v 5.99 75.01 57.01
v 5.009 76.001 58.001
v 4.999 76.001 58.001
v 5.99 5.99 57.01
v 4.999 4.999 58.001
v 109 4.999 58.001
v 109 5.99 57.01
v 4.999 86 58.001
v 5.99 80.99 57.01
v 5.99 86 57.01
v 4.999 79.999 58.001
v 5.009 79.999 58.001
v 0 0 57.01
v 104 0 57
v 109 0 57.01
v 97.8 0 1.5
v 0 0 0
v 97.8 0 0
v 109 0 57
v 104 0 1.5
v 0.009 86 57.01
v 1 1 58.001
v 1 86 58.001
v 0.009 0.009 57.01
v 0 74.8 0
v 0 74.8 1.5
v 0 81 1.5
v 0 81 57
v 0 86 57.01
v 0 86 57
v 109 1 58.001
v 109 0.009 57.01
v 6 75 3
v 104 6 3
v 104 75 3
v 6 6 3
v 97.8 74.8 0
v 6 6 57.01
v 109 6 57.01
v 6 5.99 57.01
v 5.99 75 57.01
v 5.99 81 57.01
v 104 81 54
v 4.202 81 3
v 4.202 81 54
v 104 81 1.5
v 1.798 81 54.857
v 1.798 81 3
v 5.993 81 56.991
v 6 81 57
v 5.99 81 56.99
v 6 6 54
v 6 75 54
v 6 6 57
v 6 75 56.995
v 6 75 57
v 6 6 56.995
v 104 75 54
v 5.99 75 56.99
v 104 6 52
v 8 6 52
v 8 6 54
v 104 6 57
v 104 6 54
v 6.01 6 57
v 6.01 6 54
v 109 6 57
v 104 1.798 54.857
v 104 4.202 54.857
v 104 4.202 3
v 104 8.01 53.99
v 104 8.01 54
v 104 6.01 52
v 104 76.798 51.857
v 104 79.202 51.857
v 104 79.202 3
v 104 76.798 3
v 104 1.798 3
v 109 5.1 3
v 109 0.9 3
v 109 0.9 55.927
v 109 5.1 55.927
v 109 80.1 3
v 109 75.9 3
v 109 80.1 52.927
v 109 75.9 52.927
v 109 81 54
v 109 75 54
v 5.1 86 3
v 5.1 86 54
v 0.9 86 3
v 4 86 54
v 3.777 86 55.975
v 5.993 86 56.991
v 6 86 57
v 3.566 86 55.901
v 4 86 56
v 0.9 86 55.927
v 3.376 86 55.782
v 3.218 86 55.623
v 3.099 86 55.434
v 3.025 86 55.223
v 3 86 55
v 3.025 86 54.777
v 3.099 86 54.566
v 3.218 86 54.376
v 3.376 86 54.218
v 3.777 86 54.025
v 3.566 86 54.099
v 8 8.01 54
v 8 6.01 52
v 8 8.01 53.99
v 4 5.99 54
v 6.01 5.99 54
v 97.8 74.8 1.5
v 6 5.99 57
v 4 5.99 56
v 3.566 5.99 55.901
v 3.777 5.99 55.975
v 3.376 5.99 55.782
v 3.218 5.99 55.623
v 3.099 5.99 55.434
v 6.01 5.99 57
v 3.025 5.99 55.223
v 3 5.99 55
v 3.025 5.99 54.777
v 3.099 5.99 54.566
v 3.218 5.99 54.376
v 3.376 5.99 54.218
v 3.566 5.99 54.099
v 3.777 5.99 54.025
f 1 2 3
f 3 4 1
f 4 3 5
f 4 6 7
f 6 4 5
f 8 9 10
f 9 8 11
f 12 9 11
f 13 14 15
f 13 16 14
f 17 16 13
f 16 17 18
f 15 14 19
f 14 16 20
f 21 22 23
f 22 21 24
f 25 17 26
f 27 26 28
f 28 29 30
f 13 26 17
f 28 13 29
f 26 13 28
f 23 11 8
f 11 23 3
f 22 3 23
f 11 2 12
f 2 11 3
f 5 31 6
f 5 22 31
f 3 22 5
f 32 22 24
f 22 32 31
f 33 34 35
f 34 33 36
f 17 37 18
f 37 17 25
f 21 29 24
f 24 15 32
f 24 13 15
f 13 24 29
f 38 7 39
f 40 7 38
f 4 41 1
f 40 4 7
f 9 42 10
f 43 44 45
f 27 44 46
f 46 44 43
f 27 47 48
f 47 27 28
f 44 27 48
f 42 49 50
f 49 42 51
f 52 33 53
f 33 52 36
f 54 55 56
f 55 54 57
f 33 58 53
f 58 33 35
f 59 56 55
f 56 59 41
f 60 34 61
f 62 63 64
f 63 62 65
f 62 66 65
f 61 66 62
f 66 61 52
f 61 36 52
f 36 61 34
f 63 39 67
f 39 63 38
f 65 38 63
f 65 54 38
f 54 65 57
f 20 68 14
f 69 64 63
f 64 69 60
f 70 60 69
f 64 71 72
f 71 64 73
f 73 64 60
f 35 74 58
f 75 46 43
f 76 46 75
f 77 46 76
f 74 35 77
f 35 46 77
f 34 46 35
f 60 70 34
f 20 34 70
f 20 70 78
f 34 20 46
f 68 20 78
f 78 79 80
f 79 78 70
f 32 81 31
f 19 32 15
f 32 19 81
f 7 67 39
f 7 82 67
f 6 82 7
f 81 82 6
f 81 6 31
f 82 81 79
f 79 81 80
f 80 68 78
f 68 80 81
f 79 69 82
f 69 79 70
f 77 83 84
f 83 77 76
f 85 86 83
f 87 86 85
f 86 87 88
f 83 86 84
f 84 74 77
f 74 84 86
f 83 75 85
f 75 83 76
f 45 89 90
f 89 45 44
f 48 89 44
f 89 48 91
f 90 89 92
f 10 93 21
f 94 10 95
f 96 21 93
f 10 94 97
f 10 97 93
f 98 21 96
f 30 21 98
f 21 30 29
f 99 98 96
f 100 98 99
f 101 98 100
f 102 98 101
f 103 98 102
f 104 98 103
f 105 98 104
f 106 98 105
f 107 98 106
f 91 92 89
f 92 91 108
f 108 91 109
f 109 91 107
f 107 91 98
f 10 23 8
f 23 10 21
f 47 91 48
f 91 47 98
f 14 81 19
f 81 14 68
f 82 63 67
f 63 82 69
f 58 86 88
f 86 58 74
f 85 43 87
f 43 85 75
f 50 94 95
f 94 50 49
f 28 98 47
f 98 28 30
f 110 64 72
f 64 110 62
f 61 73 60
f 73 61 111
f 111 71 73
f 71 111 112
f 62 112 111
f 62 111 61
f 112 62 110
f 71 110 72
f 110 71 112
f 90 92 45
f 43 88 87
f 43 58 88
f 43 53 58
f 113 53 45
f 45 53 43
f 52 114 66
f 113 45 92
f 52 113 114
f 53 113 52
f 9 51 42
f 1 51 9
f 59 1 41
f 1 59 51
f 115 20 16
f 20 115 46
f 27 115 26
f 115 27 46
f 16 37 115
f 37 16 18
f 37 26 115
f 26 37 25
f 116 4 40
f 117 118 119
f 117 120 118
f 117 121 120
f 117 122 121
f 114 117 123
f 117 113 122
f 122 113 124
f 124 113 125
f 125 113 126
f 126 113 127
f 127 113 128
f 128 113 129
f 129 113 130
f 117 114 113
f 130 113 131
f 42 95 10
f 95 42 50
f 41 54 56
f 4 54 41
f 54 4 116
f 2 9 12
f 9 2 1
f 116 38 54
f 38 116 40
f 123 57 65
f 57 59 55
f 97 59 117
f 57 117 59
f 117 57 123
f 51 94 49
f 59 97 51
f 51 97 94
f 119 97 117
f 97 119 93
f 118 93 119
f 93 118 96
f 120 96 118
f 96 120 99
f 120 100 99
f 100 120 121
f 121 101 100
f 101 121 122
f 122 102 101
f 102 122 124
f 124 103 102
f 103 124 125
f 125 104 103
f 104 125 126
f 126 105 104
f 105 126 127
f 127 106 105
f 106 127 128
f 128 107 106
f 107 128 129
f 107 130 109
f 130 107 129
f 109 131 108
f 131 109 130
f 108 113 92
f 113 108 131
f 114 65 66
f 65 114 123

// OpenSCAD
// ============================================================================
// cutlery_box.scad
// Graduated 3-chamber disposable-cutlery box (Option 3) — CUT-FROM-SOLID port
// of build_box.py, for a 120 x 120 x 120 mm printer (AOSEED).
//
// WHY THIS PORT EXISTS (the whole point):
//   The hand-mesh generator (build_box.py) could not keep the 1 mm rim chamfer
//   continuous across the female dovetail joints, because where a slot's flared
//   corner crosses the sloped chamfer it needs a true boolean intersection.
//   OpenSCAD HAS that boolean kernel, so here we do exactly the "cut-from-solid"
//   thing:
//      1. Build the ENTIRE box as ONE solid, WITH the chamfer already on it.
//      2. difference() out vertical dovetail prisms ( /_\ cross-section ),
//         running from just above the base plate up THROUGH the rim, to both
//         (a) form the sliding-dovetail joints, and
//         (b) split the box into 6 bed-sized pieces.
//   Because the cut is a real boolean through the already-chamfered solid, the
//   sloped chamfer<->slot edge is produced for free => the rim chamfer stays
//   CONTINUOUS across every joint, with none of the sliver hacks.
//
// ----------------------------------------------------------------------------
// HOW TO USE
//   In the app:  set `part` below (or use the Customizer dropdown), F5 to
//                preview, F6 to render, then File > Export > STL.
//   One piece (CLI):
//      openscad -o body_knife_A.stl -D 'part="knife_A"' cutlery_box.scad
//   ALL SIX (bash, run from this folder):
//      for p in knife_A knife_B fork_A fork_B spoon_A spoon_B; do \
//        openscad -o "body_$p.stl" -D "part=\"$p\"" cutlery_box.scad ; done
//   PNG preview of one piece:
//      openscad -o knife_B.png --imgsize=1400,1000 --autocenter --viewall \
//        -D 'part="knife_B"' cutlery_box.scad
//
//   Pieces are modelled in ASSEMBLED coordinates (floor-down, z=0 is the bed),
//   so importing all six STLs together shows the assembled box directly; your
//   slicer will auto-drop each one onto the plate for printing.
//
// BED SANITY: every piece is <= 120 mm in X, Y, Z.
//   Z = 58 mm. Widest piece = spoon at 117 mm (Y). A-halves reach 109 mm (X,
//   including the protruding dovetail key). All under 120.
//
// !! I could NOT run OpenSCAD to verify this file (no binary in my sandbox) !!
//   - The rim chamfer is a SMOOTH, true-45 bevel built from hull() frustums of
//     convex rectangles. Works in every OpenSCAD since ~2015 (incl. Homebrew
//     2021.01). No stepped staircase -- and, crucially, it makes box() a clean
//     well-formed solid so the per-part booleans resolve reliably (the old
//     14-slice staircase was fragile and CGAL was dropping the walls of the
//     interior parts, leaving only the key prisms => "floating boxes").
//   - roof() is still available behind USE_ROOF=true for those who have it
//     (2021.01+ snapshots); for THIS rectangular design it is identical, so it
//     is NOT required.
//   - After F6, check the console for "WARNING"/"not a valid 2-manifold".
//     If a tenon ever looks detached, bump EPS to 0.05.
// ============================================================================


/* [Part to render / export] */
part = "knife_A"; // [knife_A, knife_B, fork_A, fork_B, spoon_A, spoon_B, assembly]

/* [Chamfer method] */
// false = smooth hull() frustum bevel (default, any OpenSCAD); true = roof() (2021.01+)
USE_ROOF = false;

/* [Heights (mm)] */
BASE   = 3.0;     // floor / base-plate thickness
COMP_H = 55.0;    // interior wall height above the floor (cutlery stack depth)

/* [Walls (mm)] */
HOST_T   = 6.0;     // thickness of every wall (thick enough to host a dovetail)
HALF_LEN = 104.0;   // printed length of each half (A = near, B = far); <120 incl. key

/* [Chamber bays (mm)] */
N_COL     = 3;       // columns of cutlery per chamber
KNIFE_COL = 23.0;    // -> knife bay 69  (3 x 19 mm knives + play)
FORK_COL  = 33.0;    // -> fork  bay 99  (3 x 29 mm forks  + play)
SPOON_COL = 37.0;    // -> spoon bay 111 (3 x 34 mm spoons + play, trimmed <120)

/* [Dovetail joint (mm)] */
DT_DEPTH = 5.0;   // tail protrusion past the seam (male key depth)
DT_NECK  = 1.2;   // half-width at the seam face (narrow)
DT_FLARE = 2.1;   // half-width at the tip (wide -> locks)
DT_CLR   = 0.4;   // FLANK/seam slide clearance added to the female socket (do not change for fit)
DT_DEPTH_RELIEF = 0.3; // extra depth on the socket BACK only, so the tail tip never bottoms out

/* [Hidden-dovetail top cap / "hat" (mm)] */
// The dovetail otherwise shows its trapezoid outline on the TOP edge of the wall.
// To hide it, the MALE piece extends the wall's full-width top (chamfer included)
// across the key footprint -> a flush, continuous top. The FEMALE piece gets a
// matching top RECESS (cap footprint + CAP_CLR) so the cap drops straight in.
// Result: the top reads as one surface with a single straight seam line at the cap
// tip; the dovetail joinery lives entirely below the cap.
//
// SELF-SUPPORTING UNDERSIDE: the cap reaches the FULL wall width at the chamfer base
// (so the top edge reads as the wall extended, with NO recessed sliver on the outer
// face), and its underside is ONE planar ramp from the chamfer's OUTER CORNER
// (half-width HOST_T/2 at z = BODY_H-CHAMFER) down to the dovetail-neck half-width
// (CAP_FOOT) at CAP_SLANT_DEG from horizontal. No little horizontal step. The ramp
// reaching full width exactly at the chamfer base means "ramp top" == "chamfer base"
// (CAP_H is DERIVED). The FEMALE recess is the same ramp + CAP_CLR play.
// TRADEOFF: because the cap runs all the way to the outer corner, the female wall
// tapers to ~0 at z = BODY_H-CHAMFER -> a thin feather edge at the joint (gradual at
// CAP_SLANT_DEG, hidden inside the joint when assembled). Accepted per design intent.
CAP_SLANT_DEG = 50;     // cap underside ramp angle from horizontal (50 = self-supporting, long flare)
CAP_FOOT = DT_NECK;     // cap-underside half-width where it meets the dovetail neck
CAP_CLR = 0.3;          // slide clearance so the male cap seats into the female top recess

/* [Rim chamfer (mm)] */
CHAMFER = 1.0;    // 45-deg comfort break broken along the top wall edges

/* [Base half-lap / anti-warp (mm)] */
// Neighbouring base plates overlap as a HORIZONTAL half-lap (shiplap) at mid-base
// height, so corners stay coplanar (no lift/protrusion). Horizontal lap faces do
// NOT bind the vertical-drop assembly. Shingle direction: A->B and knife->fork->spoon.
LAP_LEN = 6;        // overlap past the A/B seam and the knife/fork seam
LAP_LEN_FS = 2;     // overlap past the fork/SPOON seam -- SMALLER: spoon is the
                    // tightest piece (117mm of the 120mm bed); a 6mm lap there
                    // would push spoon to 123mm. 2mm keeps spoon at 119mm.
LAP_Z   = BASE/2;   // 1.5 -- horizontal split height of the lap (bottom vs top half)
LAP_CLR = 0.2;      // in-plane clearance so the shelf isn't a press fit

/* [Lid — box features that receive a flat ORDERED clear sheet] */
// The lid itself is NOT printed: it's a flat ~2 mm PETG/Tritan sheet, bullnose-polished
// edges (r=LID_EDGE_R), ordered to size. We only model the box features that receive it.
LID_T            = 2.0;   // ordered sheet thickness
LID_EDGE_R       = 1.0;   // ordered sheet bullnose edge radius (for the sheet order spec)
LID_PLAY         = 0.4;   // total vertical play in the hinge groove (sheet + this)
LID_RECESS       = 2.0;   // lid TOP sits this far BELOW the rim, so the journal pocket is fully
                          // capped (rim caps the bullnose -> retains the lid when raised; tilt-in)
HINGE_AT_MINUS_X = true;  // hinge on the -x (303mm) end wall; clip on +x. (flip = mirror; default delivered)
// perimeter support ledge (lid underside rests on it at z = BODY_H-LID_T)
LEDGE_W          = 2.0;   // ledge inward protrusion (its underside ramps back at 45 deg -> self-supporting)
GROOVE_END_INSET = 0.0;   // groove reaches the corners but RUNS OUT smoothly there (no end-face / no
                          // exposed bore); GROOVE_TAPER sets the run-out length
GROOVE_TAPER     = 4.0;   // y-length over which the eased mouth tapers out at each groove end
// hinge journal (cut into the inner face of the hinge end wall, CONTINUOUS along the long edge)
GROOVE_DEPTH     = 3.0;   // 2mm lead-in slot + 1mm pocket radius -> journal sits 2mm back from the
                          // face so its cap clears the swing relief and RETAINS the lid
GROOVE_POCKET_R  = 1.0;   // journal half-cylinder radius (the bullnose sheet edge rolls in it)
// clip latch — TWO light DETENT clips on the clip end wall, flanking a central finger notch.
// "Light detent" = small overhang so the rigid sheet pops past it by hand (not a firm lock).
CLIP_W           = 8.0;   // width of EACH of the two clips
CLIP_LIP         = 0.3;   // retaining overhang (light detent; 0.3 soft .. 0.6 firm-but-stiff)
CLIP_RAMP_H      = 1.6;   // cam-ramp height (press-to-close lead-in)
// finger notch — a through-cut in the clip wall (visible from outside), centered between the
// two clips, so a fingertip can reach the lid edge and lift it (popping both clips at once).
NOTCH_W          = 20.0;  // finger-notch width
NOTCH_DEPTH      = 6.0;   // how far down from the rim to the deepest point (past the lid edge)
NOTCH_ARCH       = 4.0;   // bottom is an ELLIPTICAL arch this tall; the rest is vertical sides
                          // (NOTCH_ARCH < NOTCH_W/2 -> a gentle arch, not a deep half-circle)


/* [Hidden] */
EPS      = 0.01;          // tiny overlap so abutting solids fuse cleanly in CGAL
// Upper-chamber pieces (fork, spoon) were cut by a cell plane laid EXACTLY on the
// divider wall's far face (the lower chamber owns that wall). intersection() along a
// plane coincident with an existing box face makes CGAL leave a ZERO-THICKNESS copy
// of the wall face -> edge-manifold + "watertight" but degenerate (OpenSCAD shows it
// as a blue back-face; Tinkercad thickens it into a phantom block). SEAM_EPS nudges
// those cut planes a hair INTO the open bay so they no longer coincide with any box
// face -> no flap. 0.02 mm is physically nothing but is well clear of CGAL's tolerance.
SEAM_EPS = 0.02;
CUT_OVER = 1.0;           // how far dovetail cutters overshoot the rim (clean cut)

BODY_H    = BASE + COMP_H;     // 58  total height
END_WALL  = HOST_T;            // end walls are dovetail hosts too -> equally thick
TOTAL_LEN = 2 * HALF_LEN;      // 208 assembled length (end wall .. end wall)

// hidden-cap ramp geometry (derived).
//   CAP_HW    = cap MAX half-width = HOST_T/2 (the full wall edge) at the chamfer base.
//   CAP_RISE  = vertical height of the self-supporting CAP_SLANT_DEG underside ramp.
//   CAP_ZRAMP = where the cap reaches full width = the chamfer base (BODY_H-CHAMFER), so
//               the ramp runs straight to the chamfer OUTER CORNER (no horizontal step).
//   CAP_ZBOT  = cap bottom = ramp start; CAP_H derived from it (for reference/report).
//   CAP_ZRAMP_R = recess ramp top, shifted down by CAP_CLR so the recess ramp stays
//               parallel to the cap ramp with uniform play.
CAP_HW      = HOST_T/2;   // cap reaches the FULL wall edge at the chamfer base
CAP_RISE    = (CAP_HW - CAP_FOOT) * tan(CAP_SLANT_DEG);
CAP_ZRAMP   = BODY_H - CHAMFER;               // full width exactly at the chamfer base / outer corner
CAP_ZBOT    = CAP_ZRAMP - CAP_RISE;
CAP_H       = BODY_H - CAP_ZBOT;              // derived; reported
CAP_ZRAMP_R = CAP_ZRAMP;   // recess ramp ALSO tops at the chamfer corner (mirror the cap) -> no vertical lip
// sanity checks
assert(CAP_ZBOT > BASE + 1,
       "cap zone dips too low -- raise CAP_SLANT_DEG");
assert(CAP_HW >= DT_FLARE,
       "cap too narrow to cover the dovetail tail");

// NOTE: lid-derived constants are defined BELOW the Y-layout block, because some of
// them (INTERIOR_Y0/Y1, CLIP_CY) depend on OUTER_L / OUTER_R / EXT_W. See "lid derived".

// bay widths
KNIFE_BAY = N_COL * KNIFE_COL; // 69
FORK_BAY  = N_COL * FORK_COL;  // 99
SPOON_BAY = N_COL * SPOON_COL; // 111

// ---- Y layout (width direction): wall | bay | divider | bay | divider | bay | wall
KNIFE_Y0 = 0;
KNIFE_Y1 = HOST_T + KNIFE_BAY + HOST_T;        // 0..81   (outer wall + bay + divider)
FORK_Y0  = KNIFE_Y1;                           // 81
FORK_Y1  = FORK_Y0 + FORK_BAY + HOST_T;        // 81..186 (bay + divider)
SPOON_Y0 = FORK_Y1;                            // 186
SPOON_Y1 = SPOON_Y0 + SPOON_BAY + HOST_T;      // 186..303(bay + outer wall)
EXT_W    = SPOON_Y1;                           // 303 total width

// lengthwise wall Y-bands [y0,y1] (host the A/B dovetails) + their centers
OUTER_L  = [0, HOST_T];                                       // [0,6]    c=3
DIV_KF   = [HOST_T + KNIFE_BAY, HOST_T + KNIFE_BAY + HOST_T]; // [75,81]  c=78
DIV_FS   = [FORK_Y0 + FORK_BAY, FORK_Y0 + FORK_BAY + HOST_T]; // [180,186]c=183
OUTER_R  = [SPOON_Y1 - HOST_T, SPOON_Y1];                     // [297,303]c=300

// ---- lid derived ---- (placed AFTER OUTER_L/OUTER_R/EXT_W so nothing is forward-referenced)
LID_TOP_Z   = BODY_H - LID_RECESS;        // 56  lid TOP (recessed); rim z=58 rises LID_RECESS above it
LID_Z_UNDER = LID_TOP_Z - LID_T;          // 54  lid underside / ledge top / lowered-divider top
POCKET_CZ   = LID_TOP_Z - LID_T/2;        // 55  journal centre (lid mid) -> pocket top = LID_TOP_Z = capped
// hinge end-wall inner face x + inward direction; clip end-wall inner face x + inward dir
HINGE_INX   = HINGE_AT_MINUS_X ? END_WALL : TOTAL_LEN - END_WALL;       // 6  (default)
HINGE_IN    = HINGE_AT_MINUS_X ? 1 : -1;  // interior direction from the hinge wall (+x default)
CLIP_INX    = HINGE_AT_MINUS_X ? TOTAL_LEN - END_WALL : END_WALL;       // 202 (default)
CLIP_IN     = HINGE_AT_MINUS_X ? -1 : 1;  // interior direction from the clip wall (-x default)
POCKET_CX   = HINGE_INX - HINGE_IN*(GROOVE_DEPTH - GROOVE_POCKET_R);    // 5  pocket centre x (INTO the wall)
INTERIOR_Y0 = OUTER_L[1];                 // 6   inner face of the -y short wall
INTERIOR_Y1 = OUTER_R[0];                 // 297 inner face of the +y short wall
CLIP_CY     = EXT_W/2;                     // 151.5 clip/scallop centre (in the fork chamber)
assert(POCKET_CZ - GROOVE_POCKET_R > BASE + 1,
       "journal dips too low -- reduce LID_RECESS or LID_T");
assert(POCKET_CZ + GROOVE_POCKET_R <= LID_TOP_Z + EPS,
       "journal not capped -- lower the lid (raise LID_RECESS) or shrink GROOVE_POCKET_R");
// NOTE: with LID_RECESS the lid underside (and lowered dividers) sit BELOW CAP_ZBOT. That is
// intended: the inner dividers are cut flat below the cap zone (their hidden caps are removed,
// but the lid covers them); the perimeter/end-wall caps are untouched (full-height walls).

// the three OPEN bays are rectangular holes in the wall footprint:
//   footprint = outer rectangle MINUS these bays  (== the 6 walls; verified).
// The smooth chamfer is built from exactly this decomposition.
BAY_X0 = END_WALL;              // 6
BAY_X1 = TOTAL_LEN - END_WALL;  // 202
BAYS = [
    [BAY_X0, BAY_X1, HOST_T,   HOST_T + KNIFE_BAY],   // knife bay [6,202] x [6,75]
    [BAY_X0, BAY_X1, FORK_Y0,  FORK_Y0 + FORK_BAY],   // fork  bay [6,202] x [81,180]
    [BAY_X0, BAY_X1, SPOON_Y0, SPOON_Y0 + SPOON_BAY], // spoon bay [6,202] x [186,297]
];

YC_OUTL  = OUTER_L[0] + HOST_T/2;   // 3   outer-left wall center
YC_DIVKF = DIV_KF[0]  + HOST_T/2;   // 78  knife/fork divider center
YC_DIVFS = DIV_FS[0]  + HOST_T/2;   // 183 fork/spoon divider center
YC_OUTR  = OUTER_R[0] + HOST_T/2;   // 300 outer-right wall center

// seams
AB_SEAM = HALF_LEN;               // 104  A/B length seam (x)
SEAM_KF = FORK_Y0;                // 81   knife/fork width seam (y)
SEAM_FS = SPOON_Y0;              // 186  fork/spoon width seam (y)
ENDC_A  = END_WALL/2;             // 3    A end-wall center (x) -> chamber dovetails
ENDC_B  = TOTAL_LEN - END_WALL/2; // 205  B end-wall center (x)


// ============================================================================
// 2D wall footprint (cross-section of all walls, constant in z for the straight
// part). Union of: 2 full-width end walls + 4 lengthwise walls between them.
// ============================================================================
module wall_footprint_2d() {
    // footprint = outer rectangle minus the 3 open bays  (== the 6 walls)
    difference() {
        square([TOTAL_LEN, EXT_W]);
        for (b = BAYS) translate([b[0], b[2]]) square([b[1] - b[0], b[3] - b[2]]);
    }
}

// ============================================================================
// The full chamfered box solid = base plate + walls with a continuous 1 mm
// top-rim chamfer. Built ONCE; every piece is carved out of this.
// ============================================================================
module chamfer_cap() {
    // SMOOTH 45 rim chamfer over z[BODY_H-CHAMFER, BODY_H], in absolute coords.
    zm = BODY_H - CHAMFER;
    if (USE_ROOF) {
        // exact straight-skeleton roof, capped at CHAMFER height (needs roof()).
        intersection() {
            translate([0,0,zm]) roof() wall_footprint_2d();
            translate([0,0,zm]) linear_extrude(CHAMFER + EPS) wall_footprint_2d();
        }
    } else {
        // DEFAULT: true 45 bevel as hull() frustums of CONVEX rectangles -> smooth
        // AND a clean manifold.  Since footprint = outer - bays, the chamfer of the
        // footprint = (outer rectangle beveled inward) MINUS (each bay beveled so it
        // grows toward the top, which bevels every bay-facing rim).  All hull()s are
        // on convex rectangles, so nothing gets convex-filled.
        difference() {
            // outer perimeter frustum: full outer rect at zm -> inset by CHAMFER at top
            hull() {
                translate([0,0,zm])     linear_extrude(0.001) square([TOTAL_LEN, EXT_W]);
                translate([0,0,BODY_H]) linear_extrude(0.001) offset(delta=-CHAMFER) square([TOTAL_LEN, EXT_W]);
            }
            // each bay grows by CHAMFER toward the top -> bevels its surrounding rim.
            // (overshoots z a hair past both ends so the cut is clean.)
            for (b = BAYS)
                hull() {
                    translate([0,0,zm-EPS])     linear_extrude(0.001)
                        translate([b[0],b[2]]) offset(delta=-EPS)        square([b[1]-b[0], b[3]-b[2]]);
                    translate([0,0,BODY_H+EPS]) linear_extrude(0.001)
                        translate([b[0],b[2]]) offset(delta=CHAMFER+EPS) square([b[1]-b[0], b[3]-b[2]]);
                }
        }
    }
}

module box() {
    zm = BODY_H - CHAMFER;
    union() {
        cube([TOTAL_LEN, EXT_W, BASE]);                                        // base plate z[0,3]
        translate([0,0,BASE]) linear_extrude(zm - BASE + EPS) wall_footprint_2d(); // straight walls z[3,57]
        chamfer_cap();                                                         // smooth chamfer z[57,58]
    }
}

// ============================================================================
// Dovetail prisms ( /_\ ). Vertical, z[BASE, BODY_H+CUT_OVER] so they cut
// through the rim but leave the base plate continuous. The near face is pushed
// back EPS so a male key always fuses to its wall.
//   male key   : half_n=DT_NECK,         half_f=DT_FLARE
//   female slot: half_n=DT_NECK+DT_CLR,  half_f=DT_FLARE+DT_CLR
// ============================================================================
module dt_prism_X(seam_x, yc, half_n, half_f) {   // perpendicular to X, grows +X
    translate([0,0,BASE]) linear_extrude(BODY_H - BASE + CUT_OVER)
        polygon([[seam_x - EPS,        yc - half_n],
                 [seam_x + DT_DEPTH,   yc - half_f],
                 [seam_x + DT_DEPTH,   yc + half_f],
                 [seam_x - EPS,        yc + half_n]]);
}
module dt_prism_Y(seam_y, xc, half_n, half_f) {   // perpendicular to Y, grows +Y
    translate([0,0,BASE]) linear_extrude(BODY_H - BASE + CUT_OVER)
        polygon([[xc - half_n, seam_y - EPS],
                 [xc - half_f, seam_y + DT_DEPTH],
                 [xc + half_f, seam_y + DT_DEPTH],
                 [xc + half_n, seam_y - EPS]]);
}
module ab_key   (yc)        { dt_prism_X(AB_SEAM, yc, DT_NECK, DT_FLARE); }
module ch_key   (seam_y, xc){ dt_prism_Y(seam_y, xc, DT_NECK, DT_FLARE); }

// Female sockets = male + DT_CLR on the flanks/seam (unchanged), PLUS a straight
// back-face relief of DT_DEPTH_RELIEF so the tail tip never bottoms out. The
// relief is a rectangle tacked onto the trapezoid's tip at the SAME flare width,
// so the angled flank faces (and their 0.4 mm slide clearance) are untouched.
module ab_socket(yc) {
    dt_prism_X(AB_SEAM, yc, DT_NECK + DT_CLR, DT_FLARE + DT_CLR);
    translate([0,0,BASE]) linear_extrude(BODY_H - BASE + CUT_OVER)
        translate([AB_SEAM + DT_DEPTH, yc - (DT_FLARE + DT_CLR)])
            square([DT_DEPTH_RELIEF, 2*(DT_FLARE + DT_CLR)]);          // back relief, +X
}
module ch_socket(seam_y, xc) {
    dt_prism_Y(seam_y, xc, DT_NECK + DT_CLR, DT_FLARE + DT_CLR);
    translate([0,0,BASE]) linear_extrude(BODY_H - BASE + CUT_OVER)
        translate([xc - (DT_FLARE + DT_CLR), seam_y + DT_DEPTH])
            square([2*(DT_FLARE + DT_CLR), DT_DEPTH_RELIEF]);          // back relief, +Y
}

// ===== hidden-dovetail top cap ("hat"), SELF-SUPPORTING underside ===============
// MALE cap: a FULL-wall-width hat whose underside is ONE planar ramp from the chamfer's
// OUTER CORNER (half-width CAP_HW = HOST_T/2 at CAP_ZRAMP = BODY_H-CHAMFER) down to the
// dovetail-neck half-width (CAP_FOOT) at CAP_SLANT_DEG from horizontal -> the self-
// supporting shoulder, running straight to the corner (no horizontal step). Built as
// hull(narrow bottom slab buried in the tail neck, full-width top slab through the rim);
// box() trims it to the wall and adds the continuous rim chamfer for free, so the outer
// top edge reads as the wall extended (no recessed sliver). The protruding NOSE is left
// SQUARE (vertical) -- hidden in the female socket when assembled.
// TRADEOFF: the female wall tapers to ~0 at z=BODY_H-CHAMFER (a thin feather edge at the
// joint, gradual at CAP_SLANT_DEG) -- accepted per design intent.
module ab_cap(yc) {   // A/B seam, grows +X past the seam (length direction)
    hull() {
        translate([AB_SEAM - EPS, yc - CAP_FOOT, CAP_ZBOT])
            cube([DT_DEPTH + EPS, 2*CAP_FOOT, EPS]);
        translate([AB_SEAM - EPS, yc - CAP_HW,   CAP_ZRAMP])
            cube([DT_DEPTH + EPS, 2*CAP_HW, (BODY_H + CUT_OVER) - CAP_ZRAMP]);
    }
}
module ch_cap(seam_y, xc) {   // chamber seam, grows +Y past the seam (in the end wall)
    hull() {
        translate([xc - CAP_FOOT, seam_y - EPS, CAP_ZBOT])
            cube([2*CAP_FOOT, DT_DEPTH + EPS, EPS]);
        translate([xc - CAP_HW,   seam_y - EPS, CAP_ZRAMP])
            cube([2*CAP_HW, DT_DEPTH + EPS, (BODY_H + CUT_OVER) - CAP_ZRAMP]);
    }
}
// FEMALE recess: the SAME ramp grown by CAP_CLR (flanks, tip, floor, and ramp shifted down
// by CAP_CLR so it stays parallel) -> the cap seats with uniform slide clearance. It opens
// to the wall edge (and a hair past, into air) so the cap's full-width corner drops in;
// this is what leaves the thin female feather at the top (accepted). Open upward + toward seam.
module ab_cap_neg(yc) {
    hull() {
        translate([AB_SEAM - EPS, yc - (CAP_FOOT + CAP_CLR), CAP_ZBOT - CAP_CLR])
            cube([DT_DEPTH + CAP_CLR + EPS, 2*(CAP_FOOT + CAP_CLR), EPS]);
        translate([AB_SEAM - EPS, yc - (CAP_HW + EPS), CAP_ZRAMP_R])
            cube([DT_DEPTH + CAP_CLR + EPS, 2*(CAP_HW + EPS), (BODY_H + CUT_OVER + 1) - CAP_ZRAMP_R]);
    }
}
module ch_cap_neg(seam_y, xc) {
    hull() {
        translate([xc - (CAP_FOOT + CAP_CLR), seam_y - EPS, CAP_ZBOT - CAP_CLR])
            cube([2*(CAP_FOOT + CAP_CLR), DT_DEPTH + CAP_CLR + EPS, EPS]);
        translate([xc - (CAP_HW + EPS), seam_y - EPS, CAP_ZRAMP_R])
            cube([2*(CAP_HW + EPS), DT_DEPTH + CAP_CLR + EPS, (BODY_H + CUT_OVER + 1) - CAP_ZRAMP_R]);
    }
}
// LOWERED-DIVIDER hat: same 50-deg self-supporting cap as ab_cap, but reaching FULL width at the
// LOWERED divider top (LID_Z_UNDER) instead of the rim -- because the inner dividers are lowered
// for the lid, which strips their normal cap. It extends above the top and is trimmed flush to
// LID_Z_UNDER by divider_lower(), so the divider top reads as one surface (dovetail hidden below).
DCAP_ZRAMP = LID_Z_UNDER;            // full width at the lowered divider top (54)
DCAP_ZBOT  = DCAP_ZRAMP - CAP_RISE;  // ramp start (neck), 50 deg below
module div_cap(yc) {        // male hat on the lowered divider (A/B seam)
    hull() {
        translate([AB_SEAM - EPS, yc - CAP_FOOT, DCAP_ZBOT])
            cube([DT_DEPTH + EPS, 2*CAP_FOOT, EPS]);
        translate([AB_SEAM - EPS, yc - CAP_HW,   DCAP_ZRAMP])
            cube([DT_DEPTH + EPS, 2*CAP_HW, (BODY_H + CUT_OVER) - DCAP_ZRAMP]);
    }
}
module div_cap_neg(yc) {    // female recess to receive div_cap (with CAP_CLR slide play)
    hull() {
        translate([AB_SEAM - EPS, yc - (CAP_FOOT + CAP_CLR), DCAP_ZBOT - CAP_CLR])
            cube([DT_DEPTH + CAP_CLR + EPS, 2*(CAP_FOOT + CAP_CLR), EPS]);
        translate([AB_SEAM - EPS, yc - (CAP_HW + EPS), DCAP_ZRAMP])
            cube([DT_DEPTH + CAP_CLR + EPS, 2*(CAP_HW + EPS), (BODY_H + CUT_OVER + 1) - DCAP_ZRAMP]);
    }
}

// rectangular cell (x[xa,xb], y[ya,yb], full height + margin) used to split pieces
module cell(xa, xb, ya, yb) {
    translate([xa, ya, -1]) cube([xb - xa, yb - ya, BODY_H + 11]);
}

// ===== base half-lap (shiplap) =================================================
// HORIZONTAL lap at mid-base height: the shelf-owner keeps its BOTTOM half
// (z 0..LAP_Z) extending LAP_LEN past the seam; the neighbour has its bottom half
// REMOVED there (keeps only the top half) and lands flat on the shelf. Horizontal
// faces => no binding during the vertical drop. Shelves live entirely in the base
// (z < BASE), well clear of the wall dovetails (z >= BASE).
// Shingle = FEMALE-first (matches the no-notch dovetail assembly order, which
// lowers the male piece onto the female): the B half owns the A/B shelf (grows
// -X into A) and the UPPER chamber (fork, spoon) owns the chamber shelf (grows
// -Y into the lower chamber).  Order: spoon, fork, knife; B before A.
module lap_shelf_X(y0, y1) {                 // B-side shelf, grows -X into A past AB_SEAM
    // +EPS past AB_SEAM so the shelf interpenetrates (not just abuts) its own B body -> fuses cleanly.
    translate([AB_SEAM - LAP_LEN, y0, 0]) cube([LAP_LEN + EPS, y1 - y0, LAP_Z]);
}
module lap_neg_X(y0, y1) {                   // A-side: remove bottom half to receive it
    translate([AB_SEAM - LAP_LEN - LAP_CLR, y0 - EPS, -EPS])
        cube([LAP_LEN + LAP_CLR + EPS, (y1 - y0) + 2*EPS, LAP_Z + EPS]);
}
module lap_shelf_Y(seam_y, x0, x1, ln=LAP_LEN) {   // upper-chamber shelf, grows -Y into lower
    // grows -Y by `ln` into the lower chamber AND +Y by 2*SEAM_EPS past the seam so it
    // always overlaps the (SEAM_EPS-nudged) body floor and stays fused -> no floating shelf.
    translate([x0, seam_y - ln, 0]) cube([x1 - x0, ln + 2*SEAM_EPS, LAP_Z]);
}
module lap_neg_Y(seam_y, x0, x1, ln=LAP_LEN) {     // lower-chamber: remove bottom half
    translate([x0 - EPS, seam_y - ln - LAP_CLR, -EPS])
        cube([(x1 - x0) + 2*EPS, ln + LAP_CLR + EPS, LAP_Z + EPS]);
}

// ============================================================================
// LID FEATURES (receive a flat ORDERED clear sheet; the sheet is not printed).
// All features live at the TOP (z >= ~52), ABOVE the dovetail engagement, the half-lap
// (z<1.5) and most of the hat, so the vertical-drop assembly and joints are untouched.
// EPS overlaps throughout; no coincident coplanar faces with the existing walls.
// Default orientation: HINGE on the -x end wall (A pieces), CLIP on the +x end wall
// (B pieces), clip+scallop centred on the fork (middle) chamber.
// ============================================================================

// --- perimeter support ledge: 45-deg self-supporting brackets; rest face at LID_Z_UNDER.
//     Runs along the CLIP end wall + the two short outer walls. (Hinge wall uses the groove.)
//     Built as hull(thin top edge, wall column) -> a triangular bracket whose underside is
//     a 45-deg ramp (prints floor-down with no support). ADDED to each piece (clipped by cell).
//     Each run is INSET by LEDGE_W from the perpendicular walls so the three brackets never
//     overlap at a corner and the wall's normal chamfer wraps every corner uninterrupted.
module lid_ledge() {
    cy0 = INTERIOR_Y0 + LEDGE_W;  cy1 = INTERIOR_Y1 - LEDGE_W;  cyl = cy1 - cy0;   // clip-run y span (inset)
    sx0 = END_WALL    + LEDGE_W;  sxl = (TOTAL_LEN - 2*END_WALL) - 2*LEDGE_W;       // short-run x span (inset)
    // clip end wall (x = CLIP_INX), bracket protrudes toward interior (CLIP_IN)
    hull() {
        translate([CLIP_INX + CLIP_IN*LEDGE_W, cy0, LID_Z_UNDER - EPS]) cube([EPS, cyl, EPS]);
        translate([CLIP_INX - EPS,             cy0, LID_Z_UNDER - LEDGE_W]) cube([2*EPS, cyl, LEDGE_W]);
    }
    // OUTER_L short wall (y = INTERIOR_Y0), bracket protrudes +y
    hull() {
        translate([sx0, INTERIOR_Y0 + LEDGE_W, LID_Z_UNDER - EPS]) cube([sxl, EPS, EPS]);
        translate([sx0, INTERIOR_Y0 - EPS,     LID_Z_UNDER - LEDGE_W]) cube([sxl, 2*EPS, LEDGE_W]);
    }
    // OUTER_R short wall (y = INTERIOR_Y1), bracket protrudes -y
    hull() {
        translate([sx0, INTERIOR_Y1 - LEDGE_W, LID_Z_UNDER - EPS]) cube([sxl, EPS, EPS]);
        translate([sx0, INTERIOR_Y1 - EPS,     LID_Z_UNDER - LEDGE_W]) cube([sxl, 2*EPS, LEDGE_W]);
    }
}

// --- hinge groove: ONE 2D cross-section (journal bore + lead-in slot + 45-deg swing ramp),
//     CAPPED at the recessed lid top (LID_TOP_Z), swept along the wall. At BOTH ends the whole
//     profile RUNS OUT smoothly -- it tapers to the inner-top rim corner (HINGE_INX, BODY_H) --
//     so there is NO end-face and NO exposed bore at the corners; the groove just fades into the
//     wall. The rim caps the bullnose (retains the lid, tilt-in); the 45-deg ramp is self-
//     supporting and gives the swing clearance; the cap stays full over the bullnose => retains.
module groove_profile() {                            // 2D cross-section in (x, z)
    union() {
        translate([POCKET_CX, POCKET_CZ]) circle(r = GROOVE_POCKET_R, $fn = 28);              // journal bore
        translate([POCKET_CX, LID_Z_UNDER]) square([HINGE_INX - POCKET_CX + EPS, LID_T]);     // lead-in slot
        polygon([[POCKET_CX, LID_TOP_Z], [HINGE_INX + EPS, LID_TOP_Z], [HINGE_INX + EPS, BODY_H - CHAMFER]]); // swing relief (below the rim chamfer)
        polygon([[HINGE_INX, BODY_H - CHAMFER], [HINGE_INX + EPS, BODY_H + EPS], [HINGE_INX - CHAMFER, BODY_H + EPS]]); // rim chamfer cut, CONTINUOUS through the divider junctions (no bulge)
    }
}
module groove_extrude(y0, y1) {                      // sweep the profile along the wall, y0..y1
    translate([0, y0, 0]) rotate([90,0,0]) translate([0,0,-(y1 - y0)]) linear_extrude(y1 - y0) groove_profile();
}
module hinge_groove() {
    // journal runs STRAIGHT to the end of the wall at each side; the perpendicular short wall
    // caps the bore there (no run-out). The EPS overlap tucks the bore end into the short wall.
    groove_extrude(INTERIOR_Y0 - EPS, INTERIOR_Y1 + EPS);
}

// --- lower the inner chamber dividers to the lid underside (mid-support, no sag).
//     Removes the divider top over the full length; outer walls keep full height.
module divider_lower() {
    // x-span is the CHAMBER BAY only [BAY_X0, BAY_X1] (+EPS overlap into the end walls so the
    // cut is manifold). The end/outer walls keep their full BODY_H tops; only the two INNER
    // dividers (DIV_KF, DIV_FS) are lowered.
    translate([BAY_X0 - EPS, DIV_KF[0], LID_Z_UNDER]) cube([BAY_X1 - BAY_X0 + 2*EPS, HOST_T, BODY_H - LID_Z_UNDER + CUT_OVER]);
    translate([BAY_X0 - EPS, DIV_FS[0], LID_Z_UNDER]) cube([BAY_X1 - BAY_X0 + 2*EPS, HOST_T, BODY_H - LID_Z_UNDER + CUT_OVER]);
}

// --- retaining clips (ADDED): TWO light detent lips on the clip end wall, flanking the finger
//     notch. Each lip overhangs the RECESSED lid top (LID_TOP_Z) by CLIP_LIP and gives a soft
//     hold; a lead-in ramp above it cams the lid under on close. Anchored into the wall. Light
//     enough that lifting the lid edge (through the notch) flexes the sheet past both at once.
CLIP_OFF = NOTCH_W/2 + CLIP_W/2;     // clip centre offset from CLIP_CY (clips sit just outside the notch)
module one_clip(yc) {
    translate([0, yc - CLIP_W/2, 0]) rotate([90,0,0]) translate([0,0,-CLIP_W]) linear_extrude(CLIP_W)
        polygon([[CLIP_INX - CLIP_IN*HOST_T/2, LID_TOP_Z - 0.8],         // anchor low, into the wall (fuse)
                 [CLIP_INX + CLIP_IN*CLIP_LIP, LID_TOP_Z],               // lip tip: overhang over the lid top
                 [CLIP_INX + CLIP_IN*CLIP_LIP, LID_TOP_Z + 0.4],         // lip front
                 [CLIP_INX - CLIP_IN*HOST_T/2, LID_TOP_Z + CLIP_RAMP_H]]);// lead-in ramp up into the wall
}
module lid_clip() {
    one_clip(CLIP_CY - CLIP_OFF);
    one_clip(CLIP_CY + CLIP_OFF);
}

// --- finger notch (CUT): a through-cut in the clip end wall, centred between the two clips.
//     Vertical sides + an ELLIPTICAL arched bottom (a rounded scoop, not a sharp box). Goes
//     THROUGH the wall so it reads as a visible scoop from the outside and a fingertip can
//     reach the lid edge to lift it. Deepest point is NOTCH_DEPTH below the rim.
module lid_finger_notch() {
    arch_cz = BODY_H - NOTCH_DEPTH + NOTCH_ARCH;          // z where the vertical sides meet the arc
    // vertical-sided upper part, open to the rim
    translate([CLIP_INX - EPS, CLIP_CY - NOTCH_W/2, arch_cz - EPS])
        cube([END_WALL + 2*EPS, NOTCH_W, (BODY_H + EPS) - (arch_cz - EPS)]);
    // elliptical arched bottom (y-semi = NOTCH_W/2, z-semi = NOTCH_ARCH), through the wall
    translate([CLIP_INX - EPS, CLIP_CY, arch_cz])
        scale([1, 1, NOTCH_ARCH/(NOTCH_W/2)])
        rotate([0, 90, 0])
        cylinder(h = END_WALL + 2*EPS, r = NOTCH_W/2, $fn = 48);
}

// --- restore the inner-top rim chamfer where the LOWERED dividers meet the +x (clip) end wall.
//     The box chamfer is interrupted at those junctions (the divider fills the inner side before
//     it is lowered), leaving a full-height bulge once lowered. The -x/hinge side is already
//     handled by the continuous journal chamfer; this does the same at the +x end.
module div_chamfer_fix() {
    cz = BODY_H - CHAMFER;            // 57, chamfer base
    xf = TOTAL_LEN - END_WALL;        // 202, +x clip-wall inner face
    for (yb = [DIV_KF, DIV_FS])
        translate([0, yb[0] - EPS, 0]) rotate([90,0,0]) translate([0,0,-((yb[1]-yb[0])+2*EPS)]) linear_extrude((yb[1]-yb[0])+2*EPS)
            polygon([[xf, cz], [xf - EPS, BODY_H + EPS], [xf + CHAMFER, BODY_H + EPS]]);  // bevel toward the wall (x>202)
}

// ============================================================================
// The six pieces.  piece = intersection(box, cell + own male keys) - own sockets
//   A halves are MALE on the A/B seam (keep the key); B halves are FEMALE (slot).
//   On a chamber seam the LEFT chamber is male (+Y), the right chamber is female.
// ============================================================================
// Base half-lap shingling (FEMALE-first, Option 1):
//   A/B seam  -> the B half owns the bottom shelf (grows -X), A has the negative.
//   chamber   -> the UPPER chamber (fork, spoon) owns the shelf (grows -Y); the
//                lower chamber (knife, fork) has the negative.
//   Assembly order: spoon, fork, knife; B before A (male lowered onto female).
// Center crossings (104,81)&(104,186): the CHAMBER shelf (fork_A / spoon_A) owns the
//   crossing square; the B-half A/B shelf (knife_B / fork_B) is CLIPPED short of the
//   chamber seam by LAP_LEN so two shelves never collide.
module knife_A() {                                       // placed LAST; receives everything
    difference() {
        union() {
            intersection() {
                box();
                union() {
                    cell(-1, AB_SEAM, KNIFE_Y0 - 1, KNIFE_Y1);
                    ab_key(YC_OUTL); ab_key(YC_DIVKF); ch_key(SEAM_KF, ENDC_A);
                    ab_cap(YC_OUTL); div_cap(YC_DIVKF); ch_cap(SEAM_KF, ENDC_A);  // hide tops (divider uses LOWERED hat)
                }
            }
            intersection() { lid_ledge(); cell(-1, AB_SEAM, KNIFE_Y0 - 1, KNIFE_Y1); }  // lid support ledge
        }
        lap_neg_X(KNIFE_Y0, KNIFE_Y1);            // receive knife_B's A/B shelf
        lap_neg_Y(SEAM_KF, 0, AB_SEAM);           // receive fork_A's chamber shelf
        hinge_groove(); divider_lower(); lid_finger_notch(); div_chamfer_fix();   // lid cuts (groove hits A pieces; divider/scallop where present)
    }
}

module knife_B() {
    difference() {
        union() {
            intersection() {
                box();
                union() {
                    cell(AB_SEAM, TOTAL_LEN + 1, KNIFE_Y0 - 1, KNIFE_Y1);
                    ch_key(SEAM_KF, ENDC_B);
                    ch_cap(SEAM_KF, ENDC_B);                // hide top (male, chamber)
                }
            }
            lap_shelf_X(KNIFE_Y0, KNIFE_Y1 - LAP_LEN);  // A/B shelf -> knife_A (CLIPPED at y=81 crossing)
            intersection() { lid_ledge(); cell(AB_SEAM, TOTAL_LEN + 1, KNIFE_Y0 - 1, KNIFE_Y1); }  // lid support ledge
        }
        ab_socket(YC_OUTL); ab_socket(YC_DIVKF);
        ab_cap_neg(YC_OUTL); div_cap_neg(YC_DIVKF);      // top recesses to receive knife_A's caps (divider = LOWERED hat)
        lap_neg_Y(SEAM_KF, AB_SEAM, TOTAL_LEN);         // receive fork_B's chamber shelf
        hinge_groove(); divider_lower(); lid_finger_notch(); div_chamfer_fix();   // lid cuts
    }
}

module fork_A() {
    difference() {
        union() {
            intersection() {
                box();
                union() {
                    cell(-1, AB_SEAM, FORK_Y0 + SEAM_EPS, FORK_Y1);  // -Y cut nudged off the divider face
                    ab_key(YC_DIVFS); ch_key(SEAM_FS, ENDC_A);
                    div_cap(YC_DIVFS); ch_cap(SEAM_FS, ENDC_A);       // hide tops (divider uses LOWERED hat)
                }
            }
            lap_shelf_Y(SEAM_KF, 0, AB_SEAM);           // chamber shelf -> knife_A (owns crossing)
            intersection() { lid_ledge(); cell(-1, AB_SEAM, FORK_Y0 + SEAM_EPS, FORK_Y1); }  // lid support ledge (none in fork-A)
        }
        lap_neg_X(FORK_Y0, FORK_Y1);                    // receive fork_B's A/B shelf
        ch_socket(SEAM_KF, ENDC_A);
        ch_cap_neg(SEAM_KF, ENDC_A);                    // top recess to receive knife_A's chamber cap (female)
        lap_neg_Y(SEAM_FS, 0, AB_SEAM, LAP_LEN_FS);     // receive spoon_A's (small) chamber shelf
        hinge_groove(); divider_lower(); lid_finger_notch(); div_chamfer_fix();   // lid cuts (groove = fork-A hinge segment; divider = DIV_FS)
    }
}

module fork_B() {
    union() {
        difference() {
            union() {
                intersection() {
                    box();
                    union() {
                        cell(AB_SEAM, TOTAL_LEN + 1, FORK_Y0 + SEAM_EPS, FORK_Y1);  // -Y cut nudged off the divider face
                        ch_key(SEAM_FS, ENDC_B);
                        ch_cap(SEAM_FS, ENDC_B);                // hide top (male, chamber)
                    }
                }
                lap_shelf_X(FORK_Y0, FORK_Y1 - LAP_LEN_FS); // A/B shelf -> fork_A (CLIPPED at y=186 crossing)
                lap_shelf_Y(SEAM_KF, AB_SEAM, TOTAL_LEN);   // chamber shelf -> knife_B
                intersection() { lid_ledge(); cell(AB_SEAM, TOTAL_LEN + 1, FORK_Y0 + SEAM_EPS, FORK_Y1); }  // lid ledge (clip-end run)
            }
            ab_socket(YC_DIVFS);
            div_cap_neg(YC_DIVFS);                           // top recess to receive fork_A's A/B cap (divider = LOWERED hat)
            ch_socket(SEAM_KF, ENDC_B);
            ch_cap_neg(SEAM_KF, ENDC_B);                    // top recess to receive knife_B's chamber cap (female)
            lap_neg_Y(SEAM_FS, AB_SEAM, TOTAL_LEN, LAP_LEN_FS); // receive spoon_B's (small) chamber shelf
            hinge_groove(); divider_lower(); lid_finger_notch(); div_chamfer_fix();     // lid cuts (scallop lands here)
        }
        intersection() { lid_clip(); cell(AB_SEAM, TOTAL_LEN + 1, FORK_Y0 + SEAM_EPS, FORK_Y1); }  // retaining clip, added AFTER the scallop cut
    }
}

module spoon_A() {
    difference() {
        union() {
            intersection() {
                box();
                union() {
                    cell(-1, AB_SEAM, SPOON_Y0 + SEAM_EPS, SPOON_Y1 + 1);  // -Y cut nudged off the divider face
                    ab_key(YC_OUTR);
                    ab_cap(YC_OUTR);                        // hide top (male)
                }
            }
            lap_shelf_Y(SEAM_FS, 0, AB_SEAM, LAP_LEN_FS); // chamber shelf -> fork_A (small; owns crossing)
            intersection() { lid_ledge(); cell(-1, AB_SEAM, SPOON_Y0 + SEAM_EPS, SPOON_Y1 + 1); }  // lid support ledge (OUTER_R run)
        }
        lap_neg_X(SPOON_Y0, SPOON_Y1);                  // receive spoon_B's A/B shelf
        ch_socket(SEAM_FS, ENDC_A);
        ch_cap_neg(SEAM_FS, ENDC_A);                    // top recess to receive fork_A's chamber cap (female)
        hinge_groove(); divider_lower(); lid_finger_notch(); div_chamfer_fix();   // lid cuts (groove = spoon-A hinge segment)
    }
}

module spoon_B() {                                      // placed FIRST; owns shelves
    difference() {
        union() {
            intersection() {
                box();
                union() {
                    cell(AB_SEAM, TOTAL_LEN + 1, SPOON_Y0 + SEAM_EPS, SPOON_Y1 + 1);  // -Y cut nudged off the divider face
                }
            }
            lap_shelf_X(SPOON_Y0, SPOON_Y1);            // A/B shelf -> spoon_A
            lap_shelf_Y(SEAM_FS, AB_SEAM, TOTAL_LEN, LAP_LEN_FS); // chamber shelf -> fork_B (small)
            intersection() { lid_ledge(); cell(AB_SEAM, TOTAL_LEN + 1, SPOON_Y0 + SEAM_EPS, SPOON_Y1 + 1); }  // lid ledge (OUTER_R + clip-end runs)
        }
        ab_socket(YC_OUTR);
        ab_cap_neg(YC_OUTR);                            // top recess to receive spoon_A's A/B cap (female)
        ch_socket(SEAM_FS, ENDC_B);
        ch_cap_neg(SEAM_FS, ENDC_B);                    // top recess to receive fork_B's chamber cap (female)
        hinge_groove(); divider_lower(); lid_finger_notch(); div_chamfer_fix();   // lid cuts
    }
}

// TRUE assembled view: the six real, separable pieces in their assembled positions
// (slower to render — many booleans — but this is what actually shows the seams, the
// lowered dividers, the hinge journal, the clip, the scallop, and all the joints).
// For a fast no-cuts preview of just the outer shell, temporarily use box(); instead.
module assembly() {
    knife_A(); knife_B(); fork_A(); fork_B(); spoon_A(); spoon_B();
}

// ============================================================================
// Render dispatch
// ============================================================================
if      (part == "knife_A")  knife_A();
else if (part == "knife_B")  knife_B();
else if (part == "fork_A")   fork_A();
else if (part == "fork_B")   fork_B();
else if (part == "spoon_A")  spoon_A();
else if (part == "spoon_B")  spoon_B();
else if (part == "assembly") assembly();
else echo(str("Unknown part: ", part));
